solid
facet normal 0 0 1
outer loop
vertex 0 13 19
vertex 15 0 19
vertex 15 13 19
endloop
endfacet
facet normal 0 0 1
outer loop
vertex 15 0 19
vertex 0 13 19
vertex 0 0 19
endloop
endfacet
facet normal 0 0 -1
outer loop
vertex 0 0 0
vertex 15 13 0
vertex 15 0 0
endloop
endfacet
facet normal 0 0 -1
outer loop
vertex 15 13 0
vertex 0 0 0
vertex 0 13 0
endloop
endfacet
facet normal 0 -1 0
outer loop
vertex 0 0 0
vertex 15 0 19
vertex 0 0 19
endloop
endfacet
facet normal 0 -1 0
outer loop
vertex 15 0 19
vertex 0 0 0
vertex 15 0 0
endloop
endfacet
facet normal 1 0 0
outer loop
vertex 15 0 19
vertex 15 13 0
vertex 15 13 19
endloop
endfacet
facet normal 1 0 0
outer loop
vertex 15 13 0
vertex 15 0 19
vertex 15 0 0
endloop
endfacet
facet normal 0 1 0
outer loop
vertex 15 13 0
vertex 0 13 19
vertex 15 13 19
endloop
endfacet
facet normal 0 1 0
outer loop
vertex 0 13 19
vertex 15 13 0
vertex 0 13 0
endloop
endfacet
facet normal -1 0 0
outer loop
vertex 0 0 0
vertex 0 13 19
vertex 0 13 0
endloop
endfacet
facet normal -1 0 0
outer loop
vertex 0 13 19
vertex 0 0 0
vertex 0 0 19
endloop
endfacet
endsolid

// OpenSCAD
// Generated by SolidPython 1.0.1 on 2020-07-29 00:46:55


cube(size = [15, 13, 19]);
/***********************************************
*********      SolidPython code:      **********
************************************************
 
# import packages: SolidPython
from solid import *
from solid.utils import *
from itertools import chain, combinations, permutations


class Resize:

    def __init__(self, scad_file):
        self.scad_file = scad_file
        #self.scad_file = import_scad(scad_file)
        # cone/cylinder param:
        self.r1 = 0
        self.r2 = 0
        self.h = 0
        # rectangular prism param:
        self.w = 0
        self.l = 0
        # ellipse param:
        self.r = 0

    # import OpenScad code (file name corresponds to shape)


    # classify shape + parameters
    def assign(self, param1, param2, param3):
        if self.scad_file == 'cone.scad':
            self.r1 = param1
            self.r2 = param2
            self.h = param3
        elif self.scad_file == 'cylinder.scad':
            self.r1 = param1
            self.r2 = param2
            self.h = param3
        elif self.scad_file == 'rectangularPrism.scad':
            self.h = param1
            self.l = param2
            self.w = param3
        else:
            self.r = param1
            self.h = param2

    # resize parameters
    def iterate(self):
        x = range(3, 20, 2)
        i = 1
        if self.scad_file == 'cone.scad':
            tempList = list(permutations(x, 2))
            for temp in tempList:
                param1 = temp[0]
                param2 = temp[1]
                filepath = 'produced_scad_files/' + 'cone' + str(param1) + '_' + str(param2) + '_' + '.scad'
                scad_render_to_file(cylinder(h=param1, r1=param2, r2=0), filepath)

        elif self.scad_file == 'cylinder.scad':
            tempList = list(permutations(x, 3))
            for temp in tempList:
                param1 = temp[0]
                param2 = temp[1]
                filepath = 'produced_scad_files/' + 'cylinder' + str(param1) + '_' + str(param2) + '_' + '.scad'
                scad_render_to_file(cylinder(h=param1, r1=param2, r2=param2), filepath)

        elif self.scad_file == 'rectangularPrism.scad':
            tempList = list(permutations(x, 3))
            for temp in tempList:
                param1 = temp[0]
                param2 = temp[1]
                param3 = temp[2]
                filepath = 'produced_scad_files/' + 'rectangularPrism' + str(param1) + '_' + str(param2) + '_' + str(
                    param3) + '.scad'
                scad_render_to_file(cube(size=(param1, param2, param3)), filepath)

        elif self.scad_file == 'ellipse.scad':
            tempList = list(permutations(x, 4))
            for temp in tempList:
                param1 = temp[0]
                param2 = temp[1]
                param3 = temp[2]
                param4 = temp[3]
                filepath = 'produced_scad_files/' + 'ellipse' + str(param1) + '_' + str(param2) + '_' + str(param3) + '_' + str(param4) + '.scad'
                scad_render_to_file(scale([param1, param2, param3])(sphere(r=param4)), filepath)

    def render_to_scadfile(self):
        scad_render_to_file(scad, 'example.scad') 
 
************************************************/
